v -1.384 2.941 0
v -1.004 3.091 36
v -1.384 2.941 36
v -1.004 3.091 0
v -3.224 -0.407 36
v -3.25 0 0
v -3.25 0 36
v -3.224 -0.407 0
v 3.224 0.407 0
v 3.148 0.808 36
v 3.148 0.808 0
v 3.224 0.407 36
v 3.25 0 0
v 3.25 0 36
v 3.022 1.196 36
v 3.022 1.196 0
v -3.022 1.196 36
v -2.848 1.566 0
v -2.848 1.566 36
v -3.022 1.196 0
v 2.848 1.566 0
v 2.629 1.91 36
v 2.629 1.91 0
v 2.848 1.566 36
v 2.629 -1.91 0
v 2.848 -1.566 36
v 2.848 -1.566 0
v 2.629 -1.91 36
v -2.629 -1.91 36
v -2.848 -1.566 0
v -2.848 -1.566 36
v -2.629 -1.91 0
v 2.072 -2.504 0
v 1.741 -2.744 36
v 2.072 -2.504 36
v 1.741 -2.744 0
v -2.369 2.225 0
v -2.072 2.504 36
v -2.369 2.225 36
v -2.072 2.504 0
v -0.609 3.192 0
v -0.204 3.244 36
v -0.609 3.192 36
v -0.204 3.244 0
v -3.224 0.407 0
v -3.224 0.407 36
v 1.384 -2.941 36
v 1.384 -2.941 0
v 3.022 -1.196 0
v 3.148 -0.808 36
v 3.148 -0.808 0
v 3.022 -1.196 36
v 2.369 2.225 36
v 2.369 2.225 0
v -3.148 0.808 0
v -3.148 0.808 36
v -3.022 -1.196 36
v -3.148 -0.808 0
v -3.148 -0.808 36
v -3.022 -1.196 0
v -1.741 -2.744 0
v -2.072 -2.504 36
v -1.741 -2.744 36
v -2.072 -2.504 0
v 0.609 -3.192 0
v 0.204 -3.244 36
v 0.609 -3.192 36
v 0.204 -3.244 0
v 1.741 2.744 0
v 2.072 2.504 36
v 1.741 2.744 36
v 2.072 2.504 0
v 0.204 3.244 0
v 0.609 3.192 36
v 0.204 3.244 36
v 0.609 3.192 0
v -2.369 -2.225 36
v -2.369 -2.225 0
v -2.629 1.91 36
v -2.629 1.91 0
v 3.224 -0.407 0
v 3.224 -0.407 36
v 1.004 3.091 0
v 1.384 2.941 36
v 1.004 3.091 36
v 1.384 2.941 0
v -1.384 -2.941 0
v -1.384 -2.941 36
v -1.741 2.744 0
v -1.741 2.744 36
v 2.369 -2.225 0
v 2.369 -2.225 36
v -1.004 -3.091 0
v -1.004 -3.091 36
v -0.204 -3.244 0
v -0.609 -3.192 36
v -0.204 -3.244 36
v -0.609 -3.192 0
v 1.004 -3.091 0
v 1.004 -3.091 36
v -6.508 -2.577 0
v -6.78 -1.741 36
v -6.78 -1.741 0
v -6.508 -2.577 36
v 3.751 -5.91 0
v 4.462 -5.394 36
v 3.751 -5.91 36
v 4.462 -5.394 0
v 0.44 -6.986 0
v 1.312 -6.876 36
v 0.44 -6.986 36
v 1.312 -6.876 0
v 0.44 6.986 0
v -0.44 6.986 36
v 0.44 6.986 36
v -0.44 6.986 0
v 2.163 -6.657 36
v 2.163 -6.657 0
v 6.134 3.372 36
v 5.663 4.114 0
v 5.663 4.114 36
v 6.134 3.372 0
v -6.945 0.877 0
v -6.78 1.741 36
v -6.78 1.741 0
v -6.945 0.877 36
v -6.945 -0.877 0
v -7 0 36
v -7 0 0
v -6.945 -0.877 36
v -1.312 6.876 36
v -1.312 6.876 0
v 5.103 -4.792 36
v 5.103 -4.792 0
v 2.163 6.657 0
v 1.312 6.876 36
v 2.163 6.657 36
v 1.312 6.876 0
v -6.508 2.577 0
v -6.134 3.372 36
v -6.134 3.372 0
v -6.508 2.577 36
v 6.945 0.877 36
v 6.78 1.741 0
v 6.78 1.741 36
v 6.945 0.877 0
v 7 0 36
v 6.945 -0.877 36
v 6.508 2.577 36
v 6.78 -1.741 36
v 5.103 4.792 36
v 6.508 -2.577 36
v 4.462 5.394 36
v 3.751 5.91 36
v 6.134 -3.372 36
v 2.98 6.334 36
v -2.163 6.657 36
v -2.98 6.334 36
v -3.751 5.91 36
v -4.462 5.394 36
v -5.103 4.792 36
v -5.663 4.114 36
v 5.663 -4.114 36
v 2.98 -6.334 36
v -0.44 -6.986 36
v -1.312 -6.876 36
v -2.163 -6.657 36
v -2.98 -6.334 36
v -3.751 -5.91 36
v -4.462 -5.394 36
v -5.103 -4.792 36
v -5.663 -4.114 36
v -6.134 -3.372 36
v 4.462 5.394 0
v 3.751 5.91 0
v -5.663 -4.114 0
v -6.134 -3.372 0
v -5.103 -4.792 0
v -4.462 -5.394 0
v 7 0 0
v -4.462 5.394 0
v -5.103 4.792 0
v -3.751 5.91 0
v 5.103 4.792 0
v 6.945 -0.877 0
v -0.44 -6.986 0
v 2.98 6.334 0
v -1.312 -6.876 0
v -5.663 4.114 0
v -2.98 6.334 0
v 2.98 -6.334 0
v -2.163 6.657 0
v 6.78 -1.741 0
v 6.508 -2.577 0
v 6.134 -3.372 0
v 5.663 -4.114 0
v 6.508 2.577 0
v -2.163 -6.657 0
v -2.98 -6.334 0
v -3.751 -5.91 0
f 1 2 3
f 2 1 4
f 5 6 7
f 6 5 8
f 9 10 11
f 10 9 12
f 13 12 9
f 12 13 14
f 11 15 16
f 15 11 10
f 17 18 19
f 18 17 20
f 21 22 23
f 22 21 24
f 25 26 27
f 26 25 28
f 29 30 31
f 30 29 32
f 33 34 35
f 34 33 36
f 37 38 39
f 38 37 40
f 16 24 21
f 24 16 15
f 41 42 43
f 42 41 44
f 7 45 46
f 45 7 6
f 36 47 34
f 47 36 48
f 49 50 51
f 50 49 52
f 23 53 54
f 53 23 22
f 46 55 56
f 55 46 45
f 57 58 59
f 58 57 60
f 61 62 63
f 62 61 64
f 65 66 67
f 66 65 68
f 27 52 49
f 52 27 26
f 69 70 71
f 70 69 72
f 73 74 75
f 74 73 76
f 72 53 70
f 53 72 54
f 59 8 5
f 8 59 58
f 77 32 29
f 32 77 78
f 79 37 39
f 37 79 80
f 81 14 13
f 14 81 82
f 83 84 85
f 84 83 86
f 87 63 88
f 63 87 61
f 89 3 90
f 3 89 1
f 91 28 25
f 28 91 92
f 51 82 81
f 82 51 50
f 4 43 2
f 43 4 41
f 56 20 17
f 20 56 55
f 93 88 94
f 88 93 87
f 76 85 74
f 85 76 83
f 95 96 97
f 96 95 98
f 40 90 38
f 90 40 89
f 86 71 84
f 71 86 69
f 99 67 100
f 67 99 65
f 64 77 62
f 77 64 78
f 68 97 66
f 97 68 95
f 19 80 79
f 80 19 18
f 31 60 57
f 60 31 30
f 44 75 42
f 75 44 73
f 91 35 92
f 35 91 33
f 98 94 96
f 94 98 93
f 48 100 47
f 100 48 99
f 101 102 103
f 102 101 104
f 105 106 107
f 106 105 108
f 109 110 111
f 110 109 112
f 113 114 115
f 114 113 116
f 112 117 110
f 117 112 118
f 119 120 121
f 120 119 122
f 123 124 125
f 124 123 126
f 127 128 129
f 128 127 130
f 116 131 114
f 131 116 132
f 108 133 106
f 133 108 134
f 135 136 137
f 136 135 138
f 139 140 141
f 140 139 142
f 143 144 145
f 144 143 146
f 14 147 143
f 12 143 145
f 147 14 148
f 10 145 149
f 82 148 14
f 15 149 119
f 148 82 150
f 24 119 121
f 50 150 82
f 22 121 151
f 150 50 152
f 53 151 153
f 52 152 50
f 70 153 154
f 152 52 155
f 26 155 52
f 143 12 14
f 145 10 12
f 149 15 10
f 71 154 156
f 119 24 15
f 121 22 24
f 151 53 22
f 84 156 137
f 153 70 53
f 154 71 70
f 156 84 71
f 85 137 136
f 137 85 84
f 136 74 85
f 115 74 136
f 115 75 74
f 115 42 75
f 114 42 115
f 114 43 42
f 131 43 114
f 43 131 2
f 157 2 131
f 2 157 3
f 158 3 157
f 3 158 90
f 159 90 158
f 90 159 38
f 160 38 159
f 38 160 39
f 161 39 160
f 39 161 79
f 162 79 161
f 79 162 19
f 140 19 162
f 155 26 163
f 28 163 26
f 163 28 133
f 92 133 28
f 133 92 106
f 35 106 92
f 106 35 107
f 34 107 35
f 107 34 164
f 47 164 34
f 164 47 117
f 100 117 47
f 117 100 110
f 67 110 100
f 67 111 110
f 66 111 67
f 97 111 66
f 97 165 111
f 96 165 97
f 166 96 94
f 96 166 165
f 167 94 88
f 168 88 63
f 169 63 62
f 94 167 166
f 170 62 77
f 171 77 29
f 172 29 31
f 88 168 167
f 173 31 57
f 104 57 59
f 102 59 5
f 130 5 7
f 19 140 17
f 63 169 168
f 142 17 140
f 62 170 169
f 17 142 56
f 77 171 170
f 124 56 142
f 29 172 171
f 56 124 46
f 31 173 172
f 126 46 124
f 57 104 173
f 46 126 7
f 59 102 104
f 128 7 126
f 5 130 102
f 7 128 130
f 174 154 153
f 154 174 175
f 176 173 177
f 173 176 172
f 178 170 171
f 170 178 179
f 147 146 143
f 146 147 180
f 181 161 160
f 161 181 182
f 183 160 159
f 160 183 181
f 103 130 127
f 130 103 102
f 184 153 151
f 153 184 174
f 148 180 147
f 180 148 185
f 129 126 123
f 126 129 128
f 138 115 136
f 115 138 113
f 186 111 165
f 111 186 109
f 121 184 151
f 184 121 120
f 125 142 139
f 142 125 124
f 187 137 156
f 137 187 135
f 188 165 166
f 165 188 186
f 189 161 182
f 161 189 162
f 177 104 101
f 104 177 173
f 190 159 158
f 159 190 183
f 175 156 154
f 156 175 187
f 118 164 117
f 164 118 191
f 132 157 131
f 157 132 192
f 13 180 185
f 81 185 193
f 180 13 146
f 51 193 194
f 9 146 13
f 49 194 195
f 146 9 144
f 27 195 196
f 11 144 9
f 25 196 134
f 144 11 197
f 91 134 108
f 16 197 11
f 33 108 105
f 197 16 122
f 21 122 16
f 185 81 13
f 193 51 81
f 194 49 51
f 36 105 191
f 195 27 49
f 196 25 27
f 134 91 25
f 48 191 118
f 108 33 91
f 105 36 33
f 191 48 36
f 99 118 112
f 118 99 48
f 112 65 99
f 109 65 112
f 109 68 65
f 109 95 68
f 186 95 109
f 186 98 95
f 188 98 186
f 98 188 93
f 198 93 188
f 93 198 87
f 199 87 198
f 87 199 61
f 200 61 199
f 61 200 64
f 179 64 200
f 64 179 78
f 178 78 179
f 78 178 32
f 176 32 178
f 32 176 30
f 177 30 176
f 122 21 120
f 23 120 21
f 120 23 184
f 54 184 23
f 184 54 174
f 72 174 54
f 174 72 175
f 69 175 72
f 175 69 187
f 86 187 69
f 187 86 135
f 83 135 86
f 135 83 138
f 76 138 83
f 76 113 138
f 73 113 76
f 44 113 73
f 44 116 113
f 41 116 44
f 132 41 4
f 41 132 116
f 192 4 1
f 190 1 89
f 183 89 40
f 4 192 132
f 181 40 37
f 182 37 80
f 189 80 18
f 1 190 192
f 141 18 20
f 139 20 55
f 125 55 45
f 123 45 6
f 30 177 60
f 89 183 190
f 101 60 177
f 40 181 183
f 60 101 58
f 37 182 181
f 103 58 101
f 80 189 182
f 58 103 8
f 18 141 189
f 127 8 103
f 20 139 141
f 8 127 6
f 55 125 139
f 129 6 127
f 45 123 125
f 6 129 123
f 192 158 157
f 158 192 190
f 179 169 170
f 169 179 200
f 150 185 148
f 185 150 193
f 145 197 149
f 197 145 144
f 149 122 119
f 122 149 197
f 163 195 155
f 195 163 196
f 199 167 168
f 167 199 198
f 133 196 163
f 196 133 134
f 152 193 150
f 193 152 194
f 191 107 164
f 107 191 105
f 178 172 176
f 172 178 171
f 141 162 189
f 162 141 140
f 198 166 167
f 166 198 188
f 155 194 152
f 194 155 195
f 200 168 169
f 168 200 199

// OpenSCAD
$fn = 50;


difference() {
	union() {
		cylinder(h = 36, r = 7.0000000000);
	}
	union() {
		translate(v = [0.0000000000, 0.0000000000, -100.0000000000]) {
			cylinder(h = 200, r = 3.2500000000);
		}
		translate(v = [0.0000000000, 0.0000000000, -100.0000000000]) {
			cylinder(h = 200, r = 3.2500000000);
		}
		translate(v = [0.0000000000, 0.0000000000, -100.0000000000]) {
			cylinder(h = 200, r = 3.2500000000);
		}
		translate(v = [0.0000000000, 0.0000000000, -100.0000000000]) {
			cylinder(h = 200, r = 3.2500000000);
		}
	}
}
